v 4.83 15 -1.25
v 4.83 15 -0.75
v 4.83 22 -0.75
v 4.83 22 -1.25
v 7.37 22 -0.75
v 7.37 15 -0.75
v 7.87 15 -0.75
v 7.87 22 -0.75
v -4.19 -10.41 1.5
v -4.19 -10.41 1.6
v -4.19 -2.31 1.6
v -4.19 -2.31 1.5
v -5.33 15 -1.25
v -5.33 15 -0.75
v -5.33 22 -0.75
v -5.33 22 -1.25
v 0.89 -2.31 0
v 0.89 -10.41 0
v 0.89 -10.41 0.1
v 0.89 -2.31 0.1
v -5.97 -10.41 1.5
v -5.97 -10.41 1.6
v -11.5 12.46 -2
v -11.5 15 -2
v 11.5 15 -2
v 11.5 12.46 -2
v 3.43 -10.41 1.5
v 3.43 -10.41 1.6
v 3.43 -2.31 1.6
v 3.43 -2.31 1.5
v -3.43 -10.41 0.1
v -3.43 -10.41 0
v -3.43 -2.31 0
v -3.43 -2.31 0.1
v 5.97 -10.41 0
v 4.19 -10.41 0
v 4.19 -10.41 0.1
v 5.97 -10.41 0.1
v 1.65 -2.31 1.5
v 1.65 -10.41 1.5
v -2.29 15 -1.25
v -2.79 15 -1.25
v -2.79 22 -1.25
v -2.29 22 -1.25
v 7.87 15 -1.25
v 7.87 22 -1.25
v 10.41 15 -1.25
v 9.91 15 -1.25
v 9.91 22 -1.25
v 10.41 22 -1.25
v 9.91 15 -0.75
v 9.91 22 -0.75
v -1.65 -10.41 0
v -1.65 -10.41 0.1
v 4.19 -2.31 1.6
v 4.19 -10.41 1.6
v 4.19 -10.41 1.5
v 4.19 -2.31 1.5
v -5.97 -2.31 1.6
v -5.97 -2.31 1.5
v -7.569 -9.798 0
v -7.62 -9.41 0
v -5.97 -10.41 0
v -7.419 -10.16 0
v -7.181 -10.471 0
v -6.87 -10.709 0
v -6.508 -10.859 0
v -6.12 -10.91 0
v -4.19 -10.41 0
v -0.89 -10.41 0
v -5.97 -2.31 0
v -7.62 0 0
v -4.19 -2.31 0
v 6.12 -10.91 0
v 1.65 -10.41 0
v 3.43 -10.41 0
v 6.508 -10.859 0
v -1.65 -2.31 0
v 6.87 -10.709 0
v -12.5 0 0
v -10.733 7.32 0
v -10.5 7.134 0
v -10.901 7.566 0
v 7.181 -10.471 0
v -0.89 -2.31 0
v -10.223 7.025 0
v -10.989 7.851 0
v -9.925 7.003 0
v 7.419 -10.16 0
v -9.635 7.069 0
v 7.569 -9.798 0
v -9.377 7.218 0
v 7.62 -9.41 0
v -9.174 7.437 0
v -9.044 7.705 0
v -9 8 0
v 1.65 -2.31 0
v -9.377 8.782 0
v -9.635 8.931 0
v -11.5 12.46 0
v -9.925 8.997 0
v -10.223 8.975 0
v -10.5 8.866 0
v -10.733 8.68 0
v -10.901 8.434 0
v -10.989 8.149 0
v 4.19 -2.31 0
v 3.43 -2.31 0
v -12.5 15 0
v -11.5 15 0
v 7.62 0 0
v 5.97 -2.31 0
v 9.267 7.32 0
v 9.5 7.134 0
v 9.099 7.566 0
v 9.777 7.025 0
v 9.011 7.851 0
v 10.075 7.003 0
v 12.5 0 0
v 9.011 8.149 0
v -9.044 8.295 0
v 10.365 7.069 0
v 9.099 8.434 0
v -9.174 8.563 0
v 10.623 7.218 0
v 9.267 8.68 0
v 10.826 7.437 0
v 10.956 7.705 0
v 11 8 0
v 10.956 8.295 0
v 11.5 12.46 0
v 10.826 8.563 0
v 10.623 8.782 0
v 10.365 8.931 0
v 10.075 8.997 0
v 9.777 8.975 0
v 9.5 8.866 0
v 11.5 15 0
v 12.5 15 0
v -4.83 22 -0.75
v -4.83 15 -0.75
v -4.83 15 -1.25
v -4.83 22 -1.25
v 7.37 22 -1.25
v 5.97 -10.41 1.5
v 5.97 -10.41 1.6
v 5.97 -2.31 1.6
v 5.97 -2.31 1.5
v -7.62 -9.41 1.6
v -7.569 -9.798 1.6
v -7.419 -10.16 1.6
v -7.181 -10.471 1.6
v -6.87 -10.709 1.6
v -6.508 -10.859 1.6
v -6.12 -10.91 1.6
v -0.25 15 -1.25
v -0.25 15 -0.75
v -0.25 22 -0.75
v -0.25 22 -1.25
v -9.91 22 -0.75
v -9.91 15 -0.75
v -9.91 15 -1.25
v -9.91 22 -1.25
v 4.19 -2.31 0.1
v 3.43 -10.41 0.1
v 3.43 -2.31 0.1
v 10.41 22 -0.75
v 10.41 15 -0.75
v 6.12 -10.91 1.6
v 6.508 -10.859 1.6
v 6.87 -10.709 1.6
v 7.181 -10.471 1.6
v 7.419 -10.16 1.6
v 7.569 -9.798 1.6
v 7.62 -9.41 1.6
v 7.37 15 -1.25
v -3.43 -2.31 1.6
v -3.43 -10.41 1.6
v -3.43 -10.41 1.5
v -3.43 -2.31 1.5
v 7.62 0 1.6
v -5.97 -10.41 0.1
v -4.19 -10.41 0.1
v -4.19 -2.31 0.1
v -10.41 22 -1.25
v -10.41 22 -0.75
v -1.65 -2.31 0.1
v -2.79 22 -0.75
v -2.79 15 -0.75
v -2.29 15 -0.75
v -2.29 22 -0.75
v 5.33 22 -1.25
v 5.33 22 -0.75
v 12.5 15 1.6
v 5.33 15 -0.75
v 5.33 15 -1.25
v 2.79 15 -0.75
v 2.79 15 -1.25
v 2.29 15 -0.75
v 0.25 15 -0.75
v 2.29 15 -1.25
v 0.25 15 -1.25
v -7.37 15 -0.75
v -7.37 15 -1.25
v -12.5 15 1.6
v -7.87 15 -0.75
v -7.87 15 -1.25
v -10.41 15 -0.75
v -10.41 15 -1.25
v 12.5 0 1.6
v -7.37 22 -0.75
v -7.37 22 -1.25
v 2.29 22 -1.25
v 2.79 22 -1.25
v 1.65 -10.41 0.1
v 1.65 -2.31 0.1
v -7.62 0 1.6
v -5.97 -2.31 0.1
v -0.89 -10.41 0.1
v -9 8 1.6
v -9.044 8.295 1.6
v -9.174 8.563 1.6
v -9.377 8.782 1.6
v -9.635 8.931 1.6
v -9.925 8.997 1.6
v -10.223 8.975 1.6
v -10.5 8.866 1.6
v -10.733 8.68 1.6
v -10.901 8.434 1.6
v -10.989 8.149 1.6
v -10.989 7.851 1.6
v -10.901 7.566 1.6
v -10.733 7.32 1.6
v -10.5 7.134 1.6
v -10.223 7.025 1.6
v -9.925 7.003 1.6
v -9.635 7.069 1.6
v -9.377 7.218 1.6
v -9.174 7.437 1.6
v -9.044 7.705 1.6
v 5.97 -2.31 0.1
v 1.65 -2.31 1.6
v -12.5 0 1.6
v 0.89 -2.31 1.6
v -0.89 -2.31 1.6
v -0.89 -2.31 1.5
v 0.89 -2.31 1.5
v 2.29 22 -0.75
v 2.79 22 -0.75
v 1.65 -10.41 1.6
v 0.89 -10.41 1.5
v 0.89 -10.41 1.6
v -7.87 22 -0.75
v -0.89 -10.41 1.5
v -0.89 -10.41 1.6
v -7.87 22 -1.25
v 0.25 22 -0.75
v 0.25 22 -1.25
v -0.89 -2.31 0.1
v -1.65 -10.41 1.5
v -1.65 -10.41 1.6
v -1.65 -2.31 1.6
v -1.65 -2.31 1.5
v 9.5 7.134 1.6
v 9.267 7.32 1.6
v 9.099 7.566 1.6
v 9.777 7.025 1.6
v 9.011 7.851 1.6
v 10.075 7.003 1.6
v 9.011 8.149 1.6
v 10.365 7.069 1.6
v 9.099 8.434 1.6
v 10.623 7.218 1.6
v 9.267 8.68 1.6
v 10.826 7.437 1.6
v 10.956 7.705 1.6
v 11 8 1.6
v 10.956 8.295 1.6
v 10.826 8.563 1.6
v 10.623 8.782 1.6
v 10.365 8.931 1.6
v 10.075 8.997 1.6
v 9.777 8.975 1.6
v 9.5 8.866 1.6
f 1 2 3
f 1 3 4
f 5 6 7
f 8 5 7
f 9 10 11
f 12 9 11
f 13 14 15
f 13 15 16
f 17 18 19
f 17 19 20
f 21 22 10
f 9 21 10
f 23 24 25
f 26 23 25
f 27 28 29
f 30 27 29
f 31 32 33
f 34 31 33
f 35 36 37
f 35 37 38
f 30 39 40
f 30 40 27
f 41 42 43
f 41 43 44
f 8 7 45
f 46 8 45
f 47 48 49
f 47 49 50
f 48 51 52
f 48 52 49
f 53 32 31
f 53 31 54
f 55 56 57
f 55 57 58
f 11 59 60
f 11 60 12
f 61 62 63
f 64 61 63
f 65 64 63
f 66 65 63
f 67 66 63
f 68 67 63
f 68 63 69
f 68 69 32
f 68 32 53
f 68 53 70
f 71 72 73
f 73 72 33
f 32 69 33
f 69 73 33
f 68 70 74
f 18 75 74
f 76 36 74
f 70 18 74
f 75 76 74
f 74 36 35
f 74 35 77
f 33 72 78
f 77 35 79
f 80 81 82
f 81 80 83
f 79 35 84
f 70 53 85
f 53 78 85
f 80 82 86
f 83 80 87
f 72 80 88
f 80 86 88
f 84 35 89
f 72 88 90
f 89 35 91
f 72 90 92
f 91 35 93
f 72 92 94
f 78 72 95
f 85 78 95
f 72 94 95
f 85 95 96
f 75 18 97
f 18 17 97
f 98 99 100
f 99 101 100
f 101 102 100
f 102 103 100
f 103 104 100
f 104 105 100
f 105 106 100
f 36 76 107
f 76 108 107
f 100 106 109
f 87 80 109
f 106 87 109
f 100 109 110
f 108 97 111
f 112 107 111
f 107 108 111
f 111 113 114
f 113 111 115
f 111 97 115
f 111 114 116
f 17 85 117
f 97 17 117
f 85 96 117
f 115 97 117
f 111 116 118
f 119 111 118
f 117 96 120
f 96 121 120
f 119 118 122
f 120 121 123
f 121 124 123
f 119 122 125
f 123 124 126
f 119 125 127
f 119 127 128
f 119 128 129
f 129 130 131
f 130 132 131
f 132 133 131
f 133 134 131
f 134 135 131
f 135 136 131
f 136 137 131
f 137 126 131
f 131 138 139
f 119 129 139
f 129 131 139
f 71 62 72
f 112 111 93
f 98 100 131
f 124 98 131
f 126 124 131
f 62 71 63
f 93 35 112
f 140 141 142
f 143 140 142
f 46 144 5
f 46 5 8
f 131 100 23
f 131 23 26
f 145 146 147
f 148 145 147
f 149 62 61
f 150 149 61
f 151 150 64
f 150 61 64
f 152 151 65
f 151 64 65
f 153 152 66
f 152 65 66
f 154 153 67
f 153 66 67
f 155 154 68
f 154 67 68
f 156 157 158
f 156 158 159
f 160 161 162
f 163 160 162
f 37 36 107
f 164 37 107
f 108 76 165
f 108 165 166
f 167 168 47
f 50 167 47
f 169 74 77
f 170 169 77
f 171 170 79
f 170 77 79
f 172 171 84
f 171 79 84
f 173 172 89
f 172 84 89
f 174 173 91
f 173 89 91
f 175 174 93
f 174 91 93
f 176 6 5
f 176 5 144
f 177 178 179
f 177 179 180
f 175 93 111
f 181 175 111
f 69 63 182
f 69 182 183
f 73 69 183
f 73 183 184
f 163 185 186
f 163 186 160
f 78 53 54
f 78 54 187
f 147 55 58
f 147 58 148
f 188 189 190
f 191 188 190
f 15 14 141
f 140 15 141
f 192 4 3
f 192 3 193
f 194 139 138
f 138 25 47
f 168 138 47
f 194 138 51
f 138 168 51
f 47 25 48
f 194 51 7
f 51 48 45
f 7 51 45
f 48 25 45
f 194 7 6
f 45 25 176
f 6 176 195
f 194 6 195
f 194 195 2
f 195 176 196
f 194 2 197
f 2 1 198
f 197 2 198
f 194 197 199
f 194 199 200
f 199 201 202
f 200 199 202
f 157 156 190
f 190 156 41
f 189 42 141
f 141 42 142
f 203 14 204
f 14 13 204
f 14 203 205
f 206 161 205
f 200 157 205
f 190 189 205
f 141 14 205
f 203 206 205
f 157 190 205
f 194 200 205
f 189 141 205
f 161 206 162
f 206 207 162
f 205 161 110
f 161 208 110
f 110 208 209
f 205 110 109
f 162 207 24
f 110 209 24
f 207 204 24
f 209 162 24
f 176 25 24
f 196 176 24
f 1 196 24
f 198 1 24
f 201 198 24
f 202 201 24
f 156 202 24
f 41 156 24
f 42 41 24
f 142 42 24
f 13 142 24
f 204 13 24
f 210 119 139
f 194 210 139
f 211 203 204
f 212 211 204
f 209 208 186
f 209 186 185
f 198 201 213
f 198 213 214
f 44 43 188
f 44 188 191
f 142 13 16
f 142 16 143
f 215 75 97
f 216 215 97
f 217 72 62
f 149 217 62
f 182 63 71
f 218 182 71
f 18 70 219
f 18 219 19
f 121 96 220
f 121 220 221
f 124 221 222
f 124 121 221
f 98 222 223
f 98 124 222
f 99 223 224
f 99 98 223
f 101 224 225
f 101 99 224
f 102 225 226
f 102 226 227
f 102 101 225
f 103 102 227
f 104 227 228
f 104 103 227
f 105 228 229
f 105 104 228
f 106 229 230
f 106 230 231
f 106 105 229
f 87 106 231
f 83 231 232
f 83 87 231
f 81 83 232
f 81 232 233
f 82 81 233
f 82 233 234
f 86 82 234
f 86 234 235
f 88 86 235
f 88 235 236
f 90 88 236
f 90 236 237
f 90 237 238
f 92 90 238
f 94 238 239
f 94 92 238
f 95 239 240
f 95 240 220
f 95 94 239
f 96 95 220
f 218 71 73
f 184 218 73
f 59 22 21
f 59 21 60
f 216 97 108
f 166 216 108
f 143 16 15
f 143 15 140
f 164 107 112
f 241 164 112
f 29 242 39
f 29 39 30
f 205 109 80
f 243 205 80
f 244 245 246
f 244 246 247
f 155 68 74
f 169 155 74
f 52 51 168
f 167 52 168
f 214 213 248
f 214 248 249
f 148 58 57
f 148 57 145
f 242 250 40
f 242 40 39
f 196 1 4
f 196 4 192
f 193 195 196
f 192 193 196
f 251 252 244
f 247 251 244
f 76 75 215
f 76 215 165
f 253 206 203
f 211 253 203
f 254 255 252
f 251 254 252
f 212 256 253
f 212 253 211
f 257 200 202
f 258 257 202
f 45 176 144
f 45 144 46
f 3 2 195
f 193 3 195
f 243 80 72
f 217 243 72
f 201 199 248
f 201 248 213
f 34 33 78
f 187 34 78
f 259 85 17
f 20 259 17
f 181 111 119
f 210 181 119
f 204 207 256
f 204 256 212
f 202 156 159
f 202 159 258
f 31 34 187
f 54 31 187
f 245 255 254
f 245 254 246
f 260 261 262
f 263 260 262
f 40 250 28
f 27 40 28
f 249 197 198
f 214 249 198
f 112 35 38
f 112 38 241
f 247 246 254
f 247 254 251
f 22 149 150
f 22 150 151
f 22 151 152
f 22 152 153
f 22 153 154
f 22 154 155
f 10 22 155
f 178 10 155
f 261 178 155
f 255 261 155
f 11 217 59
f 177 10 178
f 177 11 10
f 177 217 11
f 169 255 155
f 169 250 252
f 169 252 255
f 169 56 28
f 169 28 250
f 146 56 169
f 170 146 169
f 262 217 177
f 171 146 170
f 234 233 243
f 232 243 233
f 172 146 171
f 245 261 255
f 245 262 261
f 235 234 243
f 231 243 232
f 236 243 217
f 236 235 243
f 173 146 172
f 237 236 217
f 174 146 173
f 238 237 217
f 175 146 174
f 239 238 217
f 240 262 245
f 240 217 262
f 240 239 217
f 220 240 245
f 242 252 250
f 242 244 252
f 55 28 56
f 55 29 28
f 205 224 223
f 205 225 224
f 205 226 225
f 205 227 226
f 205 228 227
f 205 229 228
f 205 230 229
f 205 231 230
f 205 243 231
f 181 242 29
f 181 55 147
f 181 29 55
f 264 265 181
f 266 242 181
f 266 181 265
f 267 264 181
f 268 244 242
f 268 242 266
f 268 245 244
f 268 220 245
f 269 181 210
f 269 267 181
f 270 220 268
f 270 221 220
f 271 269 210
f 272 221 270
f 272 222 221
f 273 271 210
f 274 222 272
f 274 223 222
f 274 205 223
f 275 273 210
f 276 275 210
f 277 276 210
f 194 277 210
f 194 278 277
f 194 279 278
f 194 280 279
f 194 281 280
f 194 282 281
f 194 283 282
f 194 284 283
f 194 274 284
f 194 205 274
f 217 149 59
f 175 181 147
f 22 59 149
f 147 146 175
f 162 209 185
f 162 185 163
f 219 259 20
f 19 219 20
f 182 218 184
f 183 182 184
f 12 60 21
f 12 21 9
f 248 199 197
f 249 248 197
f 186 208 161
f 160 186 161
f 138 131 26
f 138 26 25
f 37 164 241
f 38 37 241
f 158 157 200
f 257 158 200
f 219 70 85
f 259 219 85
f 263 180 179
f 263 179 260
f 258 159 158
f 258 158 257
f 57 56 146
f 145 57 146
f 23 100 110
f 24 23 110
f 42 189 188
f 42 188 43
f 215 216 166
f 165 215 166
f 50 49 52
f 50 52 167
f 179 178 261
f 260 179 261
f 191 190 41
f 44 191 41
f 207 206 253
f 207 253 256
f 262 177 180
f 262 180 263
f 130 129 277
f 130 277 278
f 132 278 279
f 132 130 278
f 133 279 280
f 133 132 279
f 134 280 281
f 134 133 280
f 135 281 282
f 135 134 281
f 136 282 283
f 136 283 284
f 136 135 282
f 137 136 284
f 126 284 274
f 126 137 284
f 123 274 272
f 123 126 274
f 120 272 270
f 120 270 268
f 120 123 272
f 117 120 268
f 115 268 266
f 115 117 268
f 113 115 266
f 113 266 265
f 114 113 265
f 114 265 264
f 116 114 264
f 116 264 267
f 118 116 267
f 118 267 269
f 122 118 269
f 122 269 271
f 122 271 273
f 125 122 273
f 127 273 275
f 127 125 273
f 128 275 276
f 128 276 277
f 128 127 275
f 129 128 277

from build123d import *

# Parameters (mm, degrees)
SKETCH_1_R          = 1
EXTRUDE_1_DEPTH     = 1.6
SKETCH_2_W          = 1.78
SKETCH_2_H          = 8.1
CUT_EXTRUDE_1_DEPTH = 0.1
CUT_EXTRUDE_START   = 1.6
SKETCH_3_W          = 1.78
SKETCH_3_H          = 8.1
CUT_EXTRUDE_2_DEPTH = 0.1
SKETCH_4_W          = 23
SKETCH_4_H          = 2.54
EXTRUDE_2_DEPTH     = 2
EXTRUDE_START       = 15
SKETCH_5_W          = 0.5
SKETCH_5_H          = 0.5
EXTRUDE_3_DEPTH     = 7


with BuildPart() as part:
    # 草图1 → 凸台-拉伸1 (new body)
    with BuildSketch(Plane.XY):
        with BuildLine():
            Line((-12.5, 0), (-7.62, 0))
            Line((-7.62, 0), (-7.62, -9.41))
            ThreePointArc((-7.62, -9.41), (-7.180660172, -10.470660172), (-6.12, -10.91))
            Line((-6.12, -10.91), (6.12, -10.91))
            ThreePointArc((6.12, -10.91), (7.180660172, -10.470660172), (7.62, -9.41))
            Line((7.62, -9.41), (7.62, 0))
            Line((7.62, 0), (12.5, 0))
            Line((12.5, 0), (12.5, 15))
            Line((12.5, 15), (-12.5, 15))
            Line((-12.5, 15), (-12.5, 0))
        make_face()
        with Locations((-10, 8)):
            Circle(SKETCH_1_R, mode=Mode.SUBTRACT)
        with Locations((10, 8)):
            Circle(SKETCH_1_R, mode=Mode.SUBTRACT)
    extrude(amount=EXTRUDE_1_DEPTH)

    # 草图2 → 切除-拉伸1 (cut)
    with BuildSketch(Plane.XY):
        with Locations((0, -6.36)):
            Rectangle(SKETCH_2_W, SKETCH_2_H)
        with Locations((2.54, -6.36)):
            Rectangle(SKETCH_2_W, SKETCH_2_H)
        with Locations((5.08, -6.36)):
            Rectangle(SKETCH_2_W, SKETCH_2_H)
        with Locations((-2.54, -6.36)):
            Rectangle(SKETCH_2_W, SKETCH_2_H)
        with Locations((-5.08, -6.36)):
            Rectangle(SKETCH_2_W, SKETCH_2_H)
    extrude(amount=CUT_EXTRUDE_1_DEPTH, mode=Mode.SUBTRACT)

    # 草图3 → 切除-拉伸2 (cut)
    with BuildSketch(Plane.XY.offset(CUT_EXTRUDE_START)):
        with Locations((2.54, -6.36)):
            Rectangle(SKETCH_3_W, SKETCH_3_H)
        with Locations((0, -6.36)):
            Rectangle(SKETCH_3_W, SKETCH_3_H)
        with Locations((-5.08, -6.36)):
            Rectangle(SKETCH_3_W, SKETCH_3_H)
        with Locations((-2.54, -6.36)):
            Rectangle(SKETCH_3_W, SKETCH_3_H)
        with Locations((5.08, -6.36)):
            Rectangle(SKETCH_3_W, SKETCH_3_H)
    extrude(amount=-CUT_EXTRUDE_2_DEPTH, mode=Mode.SUBTRACT)

    # 草图4 → 凸台-拉伸2 (add)
    with BuildSketch(Plane.XY):
        with Locations((0, 13.73)):
            Rectangle(SKETCH_4_W, SKETCH_4_H)
    extrude(amount=-EXTRUDE_2_DEPTH)

    # 草图5 → 凸台-拉伸3 (add)
    with BuildSketch(Plane(origin=(0, 0, 0), x_dir=(1, 0, 0), z_dir=(0, 1, 0)).offset(EXTRUDE_START)):
        with Locations((2.54, 1)):
            Rectangle(SKETCH_5_W, SKETCH_5_H)
        with Locations((0, 1)):
            Rectangle(SKETCH_5_W, SKETCH_5_H)
        with Locations((5.08, 1)):
            Rectangle(SKETCH_5_W, SKETCH_5_H)
        with Locations((7.62, 1)):
            Rectangle(SKETCH_5_W, SKETCH_5_H)
        with Locations((10.16, 1)):
            Rectangle(SKETCH_5_W, SKETCH_5_H)
        with Locations((-2.54, 1)):
            Rectangle(SKETCH_5_W, SKETCH_5_H)
        with Locations((-5.08, 1)):
            Rectangle(SKETCH_5_W, SKETCH_5_H)
        with Locations((-7.62, 1)):
            Rectangle(SKETCH_5_W, SKETCH_5_H)
        with Locations((-10.16, 1)):
            Rectangle(SKETCH_5_W, SKETCH_5_H)
    extrude(amount=EXTRUDE_3_DEPTH)


solid = part.part
